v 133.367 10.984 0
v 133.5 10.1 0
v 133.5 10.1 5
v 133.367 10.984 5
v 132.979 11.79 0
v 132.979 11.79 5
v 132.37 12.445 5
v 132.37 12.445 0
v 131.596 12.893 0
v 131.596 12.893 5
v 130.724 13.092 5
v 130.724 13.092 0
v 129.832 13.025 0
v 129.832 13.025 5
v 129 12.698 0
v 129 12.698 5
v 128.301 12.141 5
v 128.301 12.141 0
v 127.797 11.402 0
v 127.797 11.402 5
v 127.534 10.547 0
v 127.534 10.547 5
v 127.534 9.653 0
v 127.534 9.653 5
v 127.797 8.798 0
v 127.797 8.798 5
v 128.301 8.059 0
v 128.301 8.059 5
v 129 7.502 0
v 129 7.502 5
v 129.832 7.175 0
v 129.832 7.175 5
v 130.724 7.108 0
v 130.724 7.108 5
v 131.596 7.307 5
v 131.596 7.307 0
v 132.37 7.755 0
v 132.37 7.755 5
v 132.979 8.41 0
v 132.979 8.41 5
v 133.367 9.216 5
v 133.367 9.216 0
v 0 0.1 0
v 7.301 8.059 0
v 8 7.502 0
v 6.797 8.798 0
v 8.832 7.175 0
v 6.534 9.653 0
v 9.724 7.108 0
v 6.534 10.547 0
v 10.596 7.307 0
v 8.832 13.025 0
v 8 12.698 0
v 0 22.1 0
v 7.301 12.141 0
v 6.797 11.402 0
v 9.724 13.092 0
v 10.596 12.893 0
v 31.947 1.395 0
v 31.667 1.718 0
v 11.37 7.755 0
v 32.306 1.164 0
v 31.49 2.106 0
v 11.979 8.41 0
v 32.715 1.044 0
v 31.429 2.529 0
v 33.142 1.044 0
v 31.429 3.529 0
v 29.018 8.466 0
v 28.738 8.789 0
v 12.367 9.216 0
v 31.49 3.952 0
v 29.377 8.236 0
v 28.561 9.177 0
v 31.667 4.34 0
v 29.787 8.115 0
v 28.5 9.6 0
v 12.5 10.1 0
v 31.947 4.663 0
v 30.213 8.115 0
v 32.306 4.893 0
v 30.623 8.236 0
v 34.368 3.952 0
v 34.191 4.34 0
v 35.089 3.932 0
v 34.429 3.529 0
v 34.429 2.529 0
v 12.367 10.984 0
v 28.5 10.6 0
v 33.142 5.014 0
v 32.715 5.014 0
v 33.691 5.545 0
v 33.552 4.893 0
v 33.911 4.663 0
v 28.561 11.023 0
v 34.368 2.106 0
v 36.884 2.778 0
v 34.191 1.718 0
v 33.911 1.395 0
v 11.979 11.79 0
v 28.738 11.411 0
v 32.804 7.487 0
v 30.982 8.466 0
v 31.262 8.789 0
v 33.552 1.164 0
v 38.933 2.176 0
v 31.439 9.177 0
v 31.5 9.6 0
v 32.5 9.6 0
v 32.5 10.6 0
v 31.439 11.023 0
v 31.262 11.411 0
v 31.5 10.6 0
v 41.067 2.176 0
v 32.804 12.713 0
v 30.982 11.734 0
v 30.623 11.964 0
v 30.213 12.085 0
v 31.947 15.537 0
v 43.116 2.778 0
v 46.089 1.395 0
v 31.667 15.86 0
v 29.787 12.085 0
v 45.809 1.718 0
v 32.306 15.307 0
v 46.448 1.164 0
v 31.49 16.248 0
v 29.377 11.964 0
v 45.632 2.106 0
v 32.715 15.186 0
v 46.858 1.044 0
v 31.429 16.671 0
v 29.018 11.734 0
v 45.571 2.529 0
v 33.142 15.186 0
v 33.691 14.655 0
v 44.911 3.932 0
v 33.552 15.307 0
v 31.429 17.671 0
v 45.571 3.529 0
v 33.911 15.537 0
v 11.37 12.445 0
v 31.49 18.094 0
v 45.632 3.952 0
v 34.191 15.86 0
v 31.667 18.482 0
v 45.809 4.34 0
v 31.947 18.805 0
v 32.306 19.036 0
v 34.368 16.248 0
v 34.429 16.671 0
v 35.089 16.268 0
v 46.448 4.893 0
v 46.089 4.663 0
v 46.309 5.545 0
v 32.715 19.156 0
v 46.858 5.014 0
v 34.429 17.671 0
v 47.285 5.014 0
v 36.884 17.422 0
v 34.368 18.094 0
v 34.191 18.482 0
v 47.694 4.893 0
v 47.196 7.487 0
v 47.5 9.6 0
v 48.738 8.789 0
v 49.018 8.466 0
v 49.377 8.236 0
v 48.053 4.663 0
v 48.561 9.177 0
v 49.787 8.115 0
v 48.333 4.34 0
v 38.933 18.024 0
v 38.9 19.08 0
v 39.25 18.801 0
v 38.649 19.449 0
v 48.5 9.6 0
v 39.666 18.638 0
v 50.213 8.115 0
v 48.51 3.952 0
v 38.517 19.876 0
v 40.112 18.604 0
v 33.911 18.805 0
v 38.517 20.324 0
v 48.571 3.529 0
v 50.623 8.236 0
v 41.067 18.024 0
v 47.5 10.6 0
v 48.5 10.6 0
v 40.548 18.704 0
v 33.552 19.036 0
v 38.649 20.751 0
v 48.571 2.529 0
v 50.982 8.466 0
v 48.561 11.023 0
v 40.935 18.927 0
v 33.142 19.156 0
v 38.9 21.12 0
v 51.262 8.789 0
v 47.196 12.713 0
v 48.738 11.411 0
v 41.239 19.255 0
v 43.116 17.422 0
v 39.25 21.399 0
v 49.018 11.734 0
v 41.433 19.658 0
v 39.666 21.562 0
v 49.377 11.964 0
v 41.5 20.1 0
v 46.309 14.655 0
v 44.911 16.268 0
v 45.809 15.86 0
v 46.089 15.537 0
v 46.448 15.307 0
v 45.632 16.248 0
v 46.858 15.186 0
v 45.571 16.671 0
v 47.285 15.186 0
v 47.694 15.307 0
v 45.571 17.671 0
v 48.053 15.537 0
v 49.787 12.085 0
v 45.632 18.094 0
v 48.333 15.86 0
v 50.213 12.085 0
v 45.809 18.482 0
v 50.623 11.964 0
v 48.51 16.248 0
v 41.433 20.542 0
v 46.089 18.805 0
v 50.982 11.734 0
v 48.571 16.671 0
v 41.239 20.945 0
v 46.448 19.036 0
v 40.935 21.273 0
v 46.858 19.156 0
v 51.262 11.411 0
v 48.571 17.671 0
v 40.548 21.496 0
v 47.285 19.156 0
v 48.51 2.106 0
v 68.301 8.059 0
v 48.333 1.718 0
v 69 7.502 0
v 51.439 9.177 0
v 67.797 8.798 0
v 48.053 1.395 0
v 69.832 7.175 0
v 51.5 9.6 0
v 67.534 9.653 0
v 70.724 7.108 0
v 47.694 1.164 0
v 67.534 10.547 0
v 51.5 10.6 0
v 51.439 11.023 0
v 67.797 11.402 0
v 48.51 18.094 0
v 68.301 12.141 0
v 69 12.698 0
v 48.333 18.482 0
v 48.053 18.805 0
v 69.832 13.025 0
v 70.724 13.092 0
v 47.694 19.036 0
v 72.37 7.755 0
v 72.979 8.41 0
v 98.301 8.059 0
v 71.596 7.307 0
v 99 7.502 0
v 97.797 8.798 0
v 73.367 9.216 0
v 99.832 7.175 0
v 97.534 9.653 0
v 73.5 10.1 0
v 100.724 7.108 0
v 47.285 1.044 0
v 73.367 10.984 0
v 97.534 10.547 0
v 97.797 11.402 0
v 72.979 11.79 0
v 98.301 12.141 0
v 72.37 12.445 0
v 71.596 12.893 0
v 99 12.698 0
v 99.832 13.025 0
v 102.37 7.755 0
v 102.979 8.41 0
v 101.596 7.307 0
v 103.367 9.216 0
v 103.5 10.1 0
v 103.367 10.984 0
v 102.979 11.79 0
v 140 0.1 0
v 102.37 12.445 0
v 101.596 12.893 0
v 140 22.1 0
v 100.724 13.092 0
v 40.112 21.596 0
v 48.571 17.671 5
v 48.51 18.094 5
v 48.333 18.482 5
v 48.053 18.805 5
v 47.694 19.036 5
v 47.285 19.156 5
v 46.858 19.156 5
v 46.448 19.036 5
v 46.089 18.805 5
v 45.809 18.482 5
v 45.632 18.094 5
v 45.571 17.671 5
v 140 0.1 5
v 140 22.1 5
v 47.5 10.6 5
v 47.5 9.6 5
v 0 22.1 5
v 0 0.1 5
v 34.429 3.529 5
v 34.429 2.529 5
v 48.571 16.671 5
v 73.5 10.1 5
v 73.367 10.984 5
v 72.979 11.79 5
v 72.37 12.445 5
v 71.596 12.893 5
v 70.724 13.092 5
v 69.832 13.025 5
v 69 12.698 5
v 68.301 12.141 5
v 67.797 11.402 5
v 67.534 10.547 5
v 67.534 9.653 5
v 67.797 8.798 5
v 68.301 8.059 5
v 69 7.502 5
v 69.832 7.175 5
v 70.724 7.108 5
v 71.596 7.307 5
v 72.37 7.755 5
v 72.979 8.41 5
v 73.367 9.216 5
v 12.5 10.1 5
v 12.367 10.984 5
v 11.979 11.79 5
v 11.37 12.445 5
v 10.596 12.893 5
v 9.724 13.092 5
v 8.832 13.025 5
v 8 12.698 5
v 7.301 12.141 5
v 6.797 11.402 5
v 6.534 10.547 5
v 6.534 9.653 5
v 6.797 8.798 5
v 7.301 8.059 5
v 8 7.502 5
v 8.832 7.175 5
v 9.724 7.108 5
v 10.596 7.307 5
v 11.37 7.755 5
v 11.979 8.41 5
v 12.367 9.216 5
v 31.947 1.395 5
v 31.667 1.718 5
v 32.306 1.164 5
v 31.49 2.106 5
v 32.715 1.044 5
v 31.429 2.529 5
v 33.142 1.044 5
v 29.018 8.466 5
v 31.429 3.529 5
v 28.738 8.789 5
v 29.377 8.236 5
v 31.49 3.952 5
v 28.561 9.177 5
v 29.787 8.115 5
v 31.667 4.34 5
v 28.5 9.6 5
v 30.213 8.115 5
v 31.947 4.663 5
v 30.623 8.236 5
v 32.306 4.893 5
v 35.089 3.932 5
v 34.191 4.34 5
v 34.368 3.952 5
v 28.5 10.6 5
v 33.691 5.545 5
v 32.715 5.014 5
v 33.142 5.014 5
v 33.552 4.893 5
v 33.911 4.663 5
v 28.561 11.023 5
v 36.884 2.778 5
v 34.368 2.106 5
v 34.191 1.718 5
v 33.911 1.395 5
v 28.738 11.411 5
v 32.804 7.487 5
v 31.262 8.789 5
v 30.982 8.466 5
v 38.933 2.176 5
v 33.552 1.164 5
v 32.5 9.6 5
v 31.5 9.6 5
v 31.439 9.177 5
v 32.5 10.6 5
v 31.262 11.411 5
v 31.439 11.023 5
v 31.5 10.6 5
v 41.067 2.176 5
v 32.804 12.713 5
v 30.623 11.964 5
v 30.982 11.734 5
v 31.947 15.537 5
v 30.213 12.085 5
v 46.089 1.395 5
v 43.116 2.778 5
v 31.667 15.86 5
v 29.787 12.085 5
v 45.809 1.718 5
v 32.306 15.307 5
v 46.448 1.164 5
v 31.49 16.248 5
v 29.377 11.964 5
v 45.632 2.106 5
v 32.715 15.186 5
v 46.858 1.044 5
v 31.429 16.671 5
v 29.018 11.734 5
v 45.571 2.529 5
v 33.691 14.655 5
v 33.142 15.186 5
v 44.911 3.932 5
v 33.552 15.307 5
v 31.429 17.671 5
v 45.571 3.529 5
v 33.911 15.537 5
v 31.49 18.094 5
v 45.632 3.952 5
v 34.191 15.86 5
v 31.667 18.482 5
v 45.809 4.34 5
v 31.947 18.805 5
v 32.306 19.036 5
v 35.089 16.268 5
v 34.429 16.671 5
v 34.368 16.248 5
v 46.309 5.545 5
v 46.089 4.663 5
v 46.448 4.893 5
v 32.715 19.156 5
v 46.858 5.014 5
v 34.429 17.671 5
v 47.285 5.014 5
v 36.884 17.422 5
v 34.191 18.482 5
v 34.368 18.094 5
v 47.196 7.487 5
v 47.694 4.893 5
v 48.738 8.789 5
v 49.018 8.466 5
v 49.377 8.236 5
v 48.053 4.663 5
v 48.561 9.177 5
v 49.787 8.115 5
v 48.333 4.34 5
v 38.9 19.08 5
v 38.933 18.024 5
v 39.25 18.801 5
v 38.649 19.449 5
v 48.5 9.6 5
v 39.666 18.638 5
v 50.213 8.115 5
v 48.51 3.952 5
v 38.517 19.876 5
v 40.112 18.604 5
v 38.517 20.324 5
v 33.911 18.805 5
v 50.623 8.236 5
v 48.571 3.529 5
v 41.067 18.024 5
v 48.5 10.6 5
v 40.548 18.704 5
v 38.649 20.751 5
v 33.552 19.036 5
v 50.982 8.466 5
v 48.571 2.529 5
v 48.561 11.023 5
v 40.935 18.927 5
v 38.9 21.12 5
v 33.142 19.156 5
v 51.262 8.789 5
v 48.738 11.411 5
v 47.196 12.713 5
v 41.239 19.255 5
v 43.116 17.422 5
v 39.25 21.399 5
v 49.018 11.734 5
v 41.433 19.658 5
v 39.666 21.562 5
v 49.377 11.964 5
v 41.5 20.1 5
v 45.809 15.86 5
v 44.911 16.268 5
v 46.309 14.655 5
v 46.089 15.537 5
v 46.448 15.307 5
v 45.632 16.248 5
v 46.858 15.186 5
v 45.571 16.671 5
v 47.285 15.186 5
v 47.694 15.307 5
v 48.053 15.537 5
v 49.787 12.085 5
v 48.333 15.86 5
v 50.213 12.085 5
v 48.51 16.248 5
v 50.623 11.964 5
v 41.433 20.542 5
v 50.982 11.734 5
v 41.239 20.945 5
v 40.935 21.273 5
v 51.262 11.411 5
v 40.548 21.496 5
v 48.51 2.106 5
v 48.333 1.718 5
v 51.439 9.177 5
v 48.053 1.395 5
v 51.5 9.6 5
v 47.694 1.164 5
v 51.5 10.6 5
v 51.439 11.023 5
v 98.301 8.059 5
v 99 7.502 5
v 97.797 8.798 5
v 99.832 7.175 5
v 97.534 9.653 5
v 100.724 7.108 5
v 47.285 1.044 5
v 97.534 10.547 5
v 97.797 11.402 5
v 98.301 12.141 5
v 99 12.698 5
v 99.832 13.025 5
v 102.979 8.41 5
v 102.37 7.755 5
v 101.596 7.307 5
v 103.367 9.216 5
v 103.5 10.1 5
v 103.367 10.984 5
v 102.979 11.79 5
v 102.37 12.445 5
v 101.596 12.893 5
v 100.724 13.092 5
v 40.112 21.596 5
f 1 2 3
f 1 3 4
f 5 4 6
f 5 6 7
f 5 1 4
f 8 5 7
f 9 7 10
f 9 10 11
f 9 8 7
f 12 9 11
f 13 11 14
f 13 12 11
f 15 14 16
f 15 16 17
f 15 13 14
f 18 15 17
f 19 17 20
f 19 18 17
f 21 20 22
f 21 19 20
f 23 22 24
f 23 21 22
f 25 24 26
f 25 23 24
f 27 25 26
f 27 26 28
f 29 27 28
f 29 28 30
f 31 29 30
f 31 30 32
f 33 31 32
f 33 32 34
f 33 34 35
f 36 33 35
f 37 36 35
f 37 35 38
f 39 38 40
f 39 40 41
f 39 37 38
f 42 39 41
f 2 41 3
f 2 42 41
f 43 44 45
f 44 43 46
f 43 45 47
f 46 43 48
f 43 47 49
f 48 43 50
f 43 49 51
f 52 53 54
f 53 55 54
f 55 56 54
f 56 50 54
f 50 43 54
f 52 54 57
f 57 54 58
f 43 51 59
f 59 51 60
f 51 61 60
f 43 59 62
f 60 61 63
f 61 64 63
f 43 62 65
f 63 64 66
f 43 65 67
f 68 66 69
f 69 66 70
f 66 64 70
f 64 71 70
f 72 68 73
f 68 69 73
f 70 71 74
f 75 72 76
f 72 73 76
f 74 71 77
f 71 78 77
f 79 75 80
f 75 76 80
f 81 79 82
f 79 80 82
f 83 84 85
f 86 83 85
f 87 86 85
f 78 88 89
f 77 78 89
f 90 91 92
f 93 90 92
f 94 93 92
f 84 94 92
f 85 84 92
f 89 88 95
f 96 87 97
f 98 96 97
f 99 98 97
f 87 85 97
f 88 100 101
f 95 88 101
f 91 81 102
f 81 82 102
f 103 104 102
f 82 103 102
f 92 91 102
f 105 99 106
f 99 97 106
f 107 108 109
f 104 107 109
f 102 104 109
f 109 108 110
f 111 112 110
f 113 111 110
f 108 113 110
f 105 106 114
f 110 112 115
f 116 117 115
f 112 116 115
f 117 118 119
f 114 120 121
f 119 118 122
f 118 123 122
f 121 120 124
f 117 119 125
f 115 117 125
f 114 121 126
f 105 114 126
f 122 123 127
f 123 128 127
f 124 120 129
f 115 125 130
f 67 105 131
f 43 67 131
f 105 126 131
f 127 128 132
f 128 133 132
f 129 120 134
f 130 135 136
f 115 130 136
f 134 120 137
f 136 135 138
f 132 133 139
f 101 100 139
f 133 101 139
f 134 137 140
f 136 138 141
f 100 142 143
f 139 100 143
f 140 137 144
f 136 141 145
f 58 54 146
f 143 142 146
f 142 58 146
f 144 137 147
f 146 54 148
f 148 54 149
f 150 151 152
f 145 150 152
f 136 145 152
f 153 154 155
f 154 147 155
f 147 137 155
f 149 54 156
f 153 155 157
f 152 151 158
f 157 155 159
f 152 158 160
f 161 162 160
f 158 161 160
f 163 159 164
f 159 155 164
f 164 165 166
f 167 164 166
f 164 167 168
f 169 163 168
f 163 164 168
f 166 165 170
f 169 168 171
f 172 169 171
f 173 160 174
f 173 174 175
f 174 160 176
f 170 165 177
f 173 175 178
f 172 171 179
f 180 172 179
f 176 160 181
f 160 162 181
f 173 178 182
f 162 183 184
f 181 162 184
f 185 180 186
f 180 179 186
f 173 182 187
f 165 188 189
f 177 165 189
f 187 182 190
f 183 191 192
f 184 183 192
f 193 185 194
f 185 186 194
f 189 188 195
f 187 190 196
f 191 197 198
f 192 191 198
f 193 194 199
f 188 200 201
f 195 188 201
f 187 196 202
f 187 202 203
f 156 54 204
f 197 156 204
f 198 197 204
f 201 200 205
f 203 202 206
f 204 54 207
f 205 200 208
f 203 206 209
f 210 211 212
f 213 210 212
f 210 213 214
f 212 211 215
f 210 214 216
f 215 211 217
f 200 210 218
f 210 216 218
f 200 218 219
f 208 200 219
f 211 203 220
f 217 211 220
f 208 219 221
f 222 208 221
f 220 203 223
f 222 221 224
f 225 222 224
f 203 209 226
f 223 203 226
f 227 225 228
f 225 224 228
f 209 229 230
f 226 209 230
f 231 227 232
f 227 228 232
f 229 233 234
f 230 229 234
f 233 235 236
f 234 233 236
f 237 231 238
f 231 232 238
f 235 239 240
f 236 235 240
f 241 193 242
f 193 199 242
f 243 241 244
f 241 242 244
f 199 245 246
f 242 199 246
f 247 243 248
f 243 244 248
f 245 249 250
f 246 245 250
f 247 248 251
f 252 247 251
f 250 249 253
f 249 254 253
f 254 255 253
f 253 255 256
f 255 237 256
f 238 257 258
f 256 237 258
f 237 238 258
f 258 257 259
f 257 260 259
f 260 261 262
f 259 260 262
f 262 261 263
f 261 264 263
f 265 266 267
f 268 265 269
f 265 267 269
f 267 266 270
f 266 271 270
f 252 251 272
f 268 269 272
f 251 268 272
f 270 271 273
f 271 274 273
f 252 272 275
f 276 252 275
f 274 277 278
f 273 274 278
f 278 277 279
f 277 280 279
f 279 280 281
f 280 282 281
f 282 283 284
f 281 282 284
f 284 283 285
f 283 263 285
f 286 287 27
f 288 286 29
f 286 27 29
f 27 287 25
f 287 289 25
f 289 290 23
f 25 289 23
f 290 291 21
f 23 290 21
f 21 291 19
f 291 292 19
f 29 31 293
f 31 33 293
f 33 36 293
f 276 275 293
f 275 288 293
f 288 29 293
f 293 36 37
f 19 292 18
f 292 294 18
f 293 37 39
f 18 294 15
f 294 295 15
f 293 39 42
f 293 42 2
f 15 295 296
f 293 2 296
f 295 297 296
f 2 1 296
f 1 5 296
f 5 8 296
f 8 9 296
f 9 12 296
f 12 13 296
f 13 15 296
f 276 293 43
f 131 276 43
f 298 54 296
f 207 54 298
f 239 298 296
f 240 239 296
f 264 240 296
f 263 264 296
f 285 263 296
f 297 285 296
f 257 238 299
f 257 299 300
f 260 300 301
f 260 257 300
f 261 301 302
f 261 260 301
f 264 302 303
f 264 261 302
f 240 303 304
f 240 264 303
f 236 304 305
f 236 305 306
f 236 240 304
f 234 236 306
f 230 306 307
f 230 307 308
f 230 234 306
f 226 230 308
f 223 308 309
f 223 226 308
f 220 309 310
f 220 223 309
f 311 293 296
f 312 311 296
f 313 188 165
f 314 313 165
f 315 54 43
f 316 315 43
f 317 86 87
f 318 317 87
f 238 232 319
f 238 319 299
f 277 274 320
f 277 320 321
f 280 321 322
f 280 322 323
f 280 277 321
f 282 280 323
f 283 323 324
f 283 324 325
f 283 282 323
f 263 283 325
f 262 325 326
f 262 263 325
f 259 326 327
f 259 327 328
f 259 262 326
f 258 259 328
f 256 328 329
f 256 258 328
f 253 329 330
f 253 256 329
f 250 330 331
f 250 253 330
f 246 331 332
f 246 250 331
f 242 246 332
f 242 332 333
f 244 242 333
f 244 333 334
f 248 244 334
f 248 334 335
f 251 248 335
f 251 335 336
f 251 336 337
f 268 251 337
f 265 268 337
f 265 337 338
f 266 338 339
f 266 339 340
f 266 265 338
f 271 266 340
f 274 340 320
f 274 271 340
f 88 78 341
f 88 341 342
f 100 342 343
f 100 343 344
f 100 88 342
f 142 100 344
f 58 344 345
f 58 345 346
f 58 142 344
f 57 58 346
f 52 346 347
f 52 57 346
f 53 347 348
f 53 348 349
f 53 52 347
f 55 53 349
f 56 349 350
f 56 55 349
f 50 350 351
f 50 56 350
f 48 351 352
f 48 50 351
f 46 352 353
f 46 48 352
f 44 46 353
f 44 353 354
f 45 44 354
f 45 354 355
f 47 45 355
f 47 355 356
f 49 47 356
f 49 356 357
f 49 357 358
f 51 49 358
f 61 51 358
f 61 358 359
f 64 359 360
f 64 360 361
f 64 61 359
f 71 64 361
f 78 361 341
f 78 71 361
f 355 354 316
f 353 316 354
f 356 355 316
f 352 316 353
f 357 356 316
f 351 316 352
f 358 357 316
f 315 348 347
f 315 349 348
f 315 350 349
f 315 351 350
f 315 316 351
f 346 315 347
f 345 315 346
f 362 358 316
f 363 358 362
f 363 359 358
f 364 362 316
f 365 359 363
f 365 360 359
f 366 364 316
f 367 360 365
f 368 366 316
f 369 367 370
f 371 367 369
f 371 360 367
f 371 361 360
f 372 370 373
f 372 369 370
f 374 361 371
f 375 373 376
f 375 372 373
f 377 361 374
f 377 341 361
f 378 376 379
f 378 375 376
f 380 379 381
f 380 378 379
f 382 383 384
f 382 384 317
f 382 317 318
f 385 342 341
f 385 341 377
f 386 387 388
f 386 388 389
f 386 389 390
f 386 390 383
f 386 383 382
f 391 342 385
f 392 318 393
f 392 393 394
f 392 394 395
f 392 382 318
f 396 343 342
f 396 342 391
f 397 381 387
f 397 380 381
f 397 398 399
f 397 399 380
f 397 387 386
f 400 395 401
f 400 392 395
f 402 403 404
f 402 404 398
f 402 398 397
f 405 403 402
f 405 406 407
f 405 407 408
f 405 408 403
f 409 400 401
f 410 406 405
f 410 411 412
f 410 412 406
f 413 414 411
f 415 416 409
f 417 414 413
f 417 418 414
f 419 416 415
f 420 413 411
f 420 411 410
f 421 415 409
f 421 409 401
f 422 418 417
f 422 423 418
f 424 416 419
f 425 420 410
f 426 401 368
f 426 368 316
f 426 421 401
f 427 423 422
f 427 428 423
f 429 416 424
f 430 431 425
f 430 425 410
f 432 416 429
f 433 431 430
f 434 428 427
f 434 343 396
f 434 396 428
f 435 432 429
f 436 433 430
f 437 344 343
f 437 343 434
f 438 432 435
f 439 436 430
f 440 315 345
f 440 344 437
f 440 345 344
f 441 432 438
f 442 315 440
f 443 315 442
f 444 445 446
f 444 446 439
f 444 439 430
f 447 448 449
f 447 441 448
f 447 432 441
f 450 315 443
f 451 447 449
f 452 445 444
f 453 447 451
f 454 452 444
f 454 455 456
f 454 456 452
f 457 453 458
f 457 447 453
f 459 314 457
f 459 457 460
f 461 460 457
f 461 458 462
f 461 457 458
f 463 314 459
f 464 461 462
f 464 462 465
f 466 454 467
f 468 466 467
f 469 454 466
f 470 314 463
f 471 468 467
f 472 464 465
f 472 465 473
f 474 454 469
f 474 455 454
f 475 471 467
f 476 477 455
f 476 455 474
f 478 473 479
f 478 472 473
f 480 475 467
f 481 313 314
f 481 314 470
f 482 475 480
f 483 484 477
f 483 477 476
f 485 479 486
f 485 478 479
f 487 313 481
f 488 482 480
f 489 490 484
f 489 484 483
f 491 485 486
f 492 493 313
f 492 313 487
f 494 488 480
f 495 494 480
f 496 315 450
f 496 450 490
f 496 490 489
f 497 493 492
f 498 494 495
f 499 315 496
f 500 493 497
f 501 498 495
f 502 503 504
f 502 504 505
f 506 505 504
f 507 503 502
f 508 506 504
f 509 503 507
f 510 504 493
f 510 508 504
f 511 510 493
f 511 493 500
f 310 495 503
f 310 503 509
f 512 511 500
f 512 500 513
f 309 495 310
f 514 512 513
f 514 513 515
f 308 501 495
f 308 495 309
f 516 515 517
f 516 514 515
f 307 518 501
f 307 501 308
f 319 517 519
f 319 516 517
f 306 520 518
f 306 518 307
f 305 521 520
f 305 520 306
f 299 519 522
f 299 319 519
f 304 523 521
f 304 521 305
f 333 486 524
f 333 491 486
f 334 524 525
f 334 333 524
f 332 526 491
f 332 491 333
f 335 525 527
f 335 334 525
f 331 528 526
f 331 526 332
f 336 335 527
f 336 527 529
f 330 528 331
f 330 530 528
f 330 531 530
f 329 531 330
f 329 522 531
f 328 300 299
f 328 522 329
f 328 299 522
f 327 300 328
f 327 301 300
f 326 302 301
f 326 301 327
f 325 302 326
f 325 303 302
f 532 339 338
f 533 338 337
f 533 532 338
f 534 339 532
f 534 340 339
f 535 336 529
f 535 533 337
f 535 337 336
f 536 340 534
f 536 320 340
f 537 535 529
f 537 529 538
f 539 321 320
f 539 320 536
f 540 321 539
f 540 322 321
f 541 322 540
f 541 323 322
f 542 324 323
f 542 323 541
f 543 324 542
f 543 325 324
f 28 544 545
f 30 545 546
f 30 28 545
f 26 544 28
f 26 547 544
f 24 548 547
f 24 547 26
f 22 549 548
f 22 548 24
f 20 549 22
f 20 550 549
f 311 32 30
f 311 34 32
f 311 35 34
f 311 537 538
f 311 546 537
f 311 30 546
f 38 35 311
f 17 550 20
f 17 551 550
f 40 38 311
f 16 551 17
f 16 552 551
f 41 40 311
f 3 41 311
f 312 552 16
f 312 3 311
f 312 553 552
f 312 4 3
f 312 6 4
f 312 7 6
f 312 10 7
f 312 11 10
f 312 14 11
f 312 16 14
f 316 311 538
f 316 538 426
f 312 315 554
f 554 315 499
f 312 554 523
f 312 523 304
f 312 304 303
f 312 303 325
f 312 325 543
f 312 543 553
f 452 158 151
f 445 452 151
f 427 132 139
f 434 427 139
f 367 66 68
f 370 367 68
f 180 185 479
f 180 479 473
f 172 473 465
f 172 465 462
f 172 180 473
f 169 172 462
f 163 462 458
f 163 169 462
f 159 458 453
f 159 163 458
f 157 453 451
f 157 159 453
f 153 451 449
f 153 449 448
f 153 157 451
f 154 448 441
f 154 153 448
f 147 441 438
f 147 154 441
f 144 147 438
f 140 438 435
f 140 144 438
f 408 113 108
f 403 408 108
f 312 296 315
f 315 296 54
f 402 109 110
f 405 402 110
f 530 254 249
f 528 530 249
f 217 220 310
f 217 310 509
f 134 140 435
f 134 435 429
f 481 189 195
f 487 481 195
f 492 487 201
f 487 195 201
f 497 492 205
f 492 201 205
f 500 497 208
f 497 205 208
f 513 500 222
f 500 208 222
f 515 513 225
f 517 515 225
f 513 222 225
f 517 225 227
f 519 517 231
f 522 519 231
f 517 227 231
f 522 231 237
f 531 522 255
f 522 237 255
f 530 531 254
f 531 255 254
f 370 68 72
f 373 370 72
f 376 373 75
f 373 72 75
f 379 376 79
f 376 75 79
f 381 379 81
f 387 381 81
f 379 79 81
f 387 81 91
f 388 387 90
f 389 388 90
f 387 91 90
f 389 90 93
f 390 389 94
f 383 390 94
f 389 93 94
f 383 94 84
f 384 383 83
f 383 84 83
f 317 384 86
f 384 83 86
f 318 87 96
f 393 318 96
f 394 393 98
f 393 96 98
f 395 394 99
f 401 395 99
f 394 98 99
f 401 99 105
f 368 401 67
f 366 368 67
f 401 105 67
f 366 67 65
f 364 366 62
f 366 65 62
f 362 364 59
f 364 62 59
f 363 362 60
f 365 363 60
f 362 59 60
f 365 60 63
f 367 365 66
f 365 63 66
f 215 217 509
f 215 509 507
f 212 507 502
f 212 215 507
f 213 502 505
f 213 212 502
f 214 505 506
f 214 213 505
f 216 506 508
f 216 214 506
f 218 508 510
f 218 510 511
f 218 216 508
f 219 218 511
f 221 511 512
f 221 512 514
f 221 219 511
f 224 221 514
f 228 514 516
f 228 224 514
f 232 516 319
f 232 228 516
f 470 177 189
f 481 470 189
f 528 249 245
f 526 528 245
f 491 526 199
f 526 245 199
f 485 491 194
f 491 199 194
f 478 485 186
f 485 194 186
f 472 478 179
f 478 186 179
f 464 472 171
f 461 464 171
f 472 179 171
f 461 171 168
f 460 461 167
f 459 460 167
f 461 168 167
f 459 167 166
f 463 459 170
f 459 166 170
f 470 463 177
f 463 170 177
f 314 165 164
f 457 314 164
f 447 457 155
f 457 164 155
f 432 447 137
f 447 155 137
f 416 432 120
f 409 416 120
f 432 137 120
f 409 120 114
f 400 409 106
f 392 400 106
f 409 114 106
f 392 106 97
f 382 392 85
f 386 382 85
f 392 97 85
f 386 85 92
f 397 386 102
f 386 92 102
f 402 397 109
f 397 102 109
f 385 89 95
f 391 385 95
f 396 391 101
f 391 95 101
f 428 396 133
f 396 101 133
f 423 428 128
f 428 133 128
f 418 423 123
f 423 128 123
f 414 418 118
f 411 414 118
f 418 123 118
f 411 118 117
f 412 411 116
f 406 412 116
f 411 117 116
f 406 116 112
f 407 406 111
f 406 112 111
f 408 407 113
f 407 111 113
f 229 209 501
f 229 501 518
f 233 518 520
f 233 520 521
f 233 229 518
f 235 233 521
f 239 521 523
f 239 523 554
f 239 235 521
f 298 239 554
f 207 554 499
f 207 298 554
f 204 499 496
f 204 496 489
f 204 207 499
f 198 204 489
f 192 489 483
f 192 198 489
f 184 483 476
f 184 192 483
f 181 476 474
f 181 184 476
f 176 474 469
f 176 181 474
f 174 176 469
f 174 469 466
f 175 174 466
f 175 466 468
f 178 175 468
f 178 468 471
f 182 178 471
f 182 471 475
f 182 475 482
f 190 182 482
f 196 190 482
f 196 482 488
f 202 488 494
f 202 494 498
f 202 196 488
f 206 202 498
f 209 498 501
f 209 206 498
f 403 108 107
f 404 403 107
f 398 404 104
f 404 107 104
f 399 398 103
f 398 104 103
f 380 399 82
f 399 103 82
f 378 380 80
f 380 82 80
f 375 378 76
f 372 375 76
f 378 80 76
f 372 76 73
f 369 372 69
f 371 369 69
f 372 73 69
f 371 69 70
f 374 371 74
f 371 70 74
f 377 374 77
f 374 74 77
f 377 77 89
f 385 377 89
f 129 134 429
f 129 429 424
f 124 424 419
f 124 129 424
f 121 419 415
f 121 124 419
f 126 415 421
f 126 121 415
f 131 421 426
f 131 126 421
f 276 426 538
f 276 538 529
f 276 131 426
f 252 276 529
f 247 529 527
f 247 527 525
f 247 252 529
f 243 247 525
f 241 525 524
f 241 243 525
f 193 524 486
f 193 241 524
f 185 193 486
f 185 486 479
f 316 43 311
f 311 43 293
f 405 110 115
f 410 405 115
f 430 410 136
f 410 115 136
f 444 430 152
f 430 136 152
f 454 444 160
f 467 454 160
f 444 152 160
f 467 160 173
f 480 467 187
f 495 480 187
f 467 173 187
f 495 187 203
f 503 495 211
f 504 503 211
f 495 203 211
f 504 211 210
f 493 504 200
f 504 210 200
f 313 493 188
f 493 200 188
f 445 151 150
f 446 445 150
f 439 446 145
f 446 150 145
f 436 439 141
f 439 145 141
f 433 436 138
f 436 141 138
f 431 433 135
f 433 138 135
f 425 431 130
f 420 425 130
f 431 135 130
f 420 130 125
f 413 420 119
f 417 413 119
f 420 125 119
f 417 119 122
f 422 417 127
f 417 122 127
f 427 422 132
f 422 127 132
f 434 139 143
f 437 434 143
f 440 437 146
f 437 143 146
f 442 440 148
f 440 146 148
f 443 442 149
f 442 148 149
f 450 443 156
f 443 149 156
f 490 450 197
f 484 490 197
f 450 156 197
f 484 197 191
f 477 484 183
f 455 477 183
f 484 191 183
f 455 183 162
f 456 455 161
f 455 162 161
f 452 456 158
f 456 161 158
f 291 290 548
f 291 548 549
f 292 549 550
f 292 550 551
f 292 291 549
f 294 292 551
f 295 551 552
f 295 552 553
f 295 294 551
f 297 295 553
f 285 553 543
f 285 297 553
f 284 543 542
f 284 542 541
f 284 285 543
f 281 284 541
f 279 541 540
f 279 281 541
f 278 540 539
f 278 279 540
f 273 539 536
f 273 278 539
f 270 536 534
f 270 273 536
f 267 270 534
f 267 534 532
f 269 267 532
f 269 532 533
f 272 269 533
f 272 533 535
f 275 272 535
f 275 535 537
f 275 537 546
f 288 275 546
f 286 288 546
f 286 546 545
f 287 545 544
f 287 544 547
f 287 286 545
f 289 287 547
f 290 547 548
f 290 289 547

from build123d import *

# Parameters (mm, degrees)
SKETCH_1_R      = 1.5
SKETCH_1_R_2    = 3
EXTRUDE_1_DEPTH = 5


with BuildPart() as part:
    # 스케치1 → 보스-돌출1 (new body)
    with BuildSketch(Plane.XY):
        Polygon((0, 10.1), (0, 0.1), (140, 0.1), (140, 10.1), (140, 22.1), (0, 22.1), align=None)
        with Locations((40, 20.1)):
            Circle(SKETCH_1_R, mode=Mode.SUBTRACT)
        with Locations((70.5, 10.1)):
            Circle(SKETCH_1_R_2, mode=Mode.SUBTRACT)
        with Locations((100.5, 10.1)):
            Circle(SKETCH_1_R_2, mode=Mode.SUBTRACT)
        with Locations((130.5, 10.1)):
            Circle(SKETCH_1_R_2, mode=Mode.SUBTRACT)
        with Locations((9.5, 10.1)):
            Circle(SKETCH_1_R_2, mode=Mode.SUBTRACT)
        with BuildLine():
            Line((32.5, 10.1), (32.5, 10.6))
            ThreePointArc((32.5, 10.6), (40, 18.1), (47.5, 10.6))
            Line((47.5, 10.6), (47.5, 10.1))
            Line((47.5, 10.1), (47.5, 9.6))
            ThreePointArc((47.5, 9.6), (40, 2.1), (32.5, 9.6))
            Line((32.5, 9.6), (32.5, 10.1))
        make_face(mode=Mode.SUBTRACT)
        with BuildLine():
            Line((31.428932188, 3.028932188), (31.428932188, 3.528932188))
            ThreePointArc((31.428932188, 3.528932188), (32.928932188, 5.028932188), (34.428932188, 3.528932188))
            Line((34.428932188, 3.528932188), (34.428932188, 3.028932188))
            Line((34.428932188, 3.028932188), (34.428932188, 2.528932188))
            ThreePointArc((34.428932188, 2.528932188), (32.928932188, 1.028932188), (31.428932188, 2.528932188))
            Line((31.428932188, 2.528932188), (31.428932188, 3.028932188))
        make_face(mode=Mode.SUBTRACT)
        with BuildLine():
            Line((28.5, 10.1), (28.5, 10.6))
            ThreePointArc((28.5, 10.6), (30, 12.1), (31.5, 10.6))
            Line((31.5, 10.6), (31.5, 10.1))
            Line((31.5, 10.1), (31.5, 9.6))
            ThreePointArc((31.5, 9.6), (30, 8.1), (28.5, 9.6))
            Line((28.5, 9.6), (28.5, 10.1))
        make_face(mode=Mode.SUBTRACT)
        with BuildLine():
            Line((31.428932188, 17.171067812), (31.428932188, 17.671067812))
            ThreePointArc((31.428932188, 17.671067812), (32.928932188, 19.171067812), (34.428932188, 17.671067812))
            Line((34.428932188, 17.671067812), (34.428932188, 17.171067812))
            Line((34.428932188, 17.171067812), (34.428932188, 16.671067812))
            ThreePointArc((34.428932188, 16.671067812), (32.928932188, 15.171067812), (31.428932188, 16.671067812))
            Line((31.428932188, 16.671067812), (31.428932188, 17.171067812))
        make_face(mode=Mode.SUBTRACT)
        with BuildLine():
            Line((45.571067812, 17.171067812), (45.571067812, 16.671067812))
            ThreePointArc((45.571067812, 16.671067812), (47.071067812, 15.171067812), (48.571067812, 16.671067812))
            Line((48.571067812, 16.671067812), (48.571067812, 17.171067812))
            Line((48.571067812, 17.171067812), (48.571067812, 17.671067812))
            ThreePointArc((48.571067812, 17.671067812), (47.071067812, 19.171067812), (45.571067812, 17.671067812))
            Line((45.571067812, 17.671067812), (45.571067812, 17.171067812))
        make_face(mode=Mode.SUBTRACT)
        with BuildLine():
            Line((51.5, 10.1), (51.5, 9.6))
            ThreePointArc((51.5, 9.6), (50, 8.1), (48.5, 9.6))
            Line((48.5, 9.6), (48.5, 10.1))
            Line((48.5, 10.1), (48.5, 10.6))
            ThreePointArc((48.5, 10.6), (50, 12.1), (51.5, 10.6))
            Line((51.5, 10.6), (51.5, 10.1))
        make_face(mode=Mode.SUBTRACT)
        with BuildLine():
            Line((48.571067812, 3.028932188), (48.571067812, 3.528932188))
            ThreePointArc((48.571067812, 3.528932188), (47.071067812, 5.028932188), (45.571067812, 3.528932188))
            Line((45.571067812, 3.528932188), (45.571067812, 3.028932188))
            Line((45.571067812, 3.028932188), (45.571067812, 2.528932188))
            ThreePointArc((45.571067812, 2.528932188), (47.071067812, 1.028932188), (48.571067812, 2.528932188))
            Line((48.571067812, 2.528932188), (48.571067812, 3.028932188))
        make_face(mode=Mode.SUBTRACT)
    extrude(amount=EXTRUDE_1_DEPTH)


solid = part.part
